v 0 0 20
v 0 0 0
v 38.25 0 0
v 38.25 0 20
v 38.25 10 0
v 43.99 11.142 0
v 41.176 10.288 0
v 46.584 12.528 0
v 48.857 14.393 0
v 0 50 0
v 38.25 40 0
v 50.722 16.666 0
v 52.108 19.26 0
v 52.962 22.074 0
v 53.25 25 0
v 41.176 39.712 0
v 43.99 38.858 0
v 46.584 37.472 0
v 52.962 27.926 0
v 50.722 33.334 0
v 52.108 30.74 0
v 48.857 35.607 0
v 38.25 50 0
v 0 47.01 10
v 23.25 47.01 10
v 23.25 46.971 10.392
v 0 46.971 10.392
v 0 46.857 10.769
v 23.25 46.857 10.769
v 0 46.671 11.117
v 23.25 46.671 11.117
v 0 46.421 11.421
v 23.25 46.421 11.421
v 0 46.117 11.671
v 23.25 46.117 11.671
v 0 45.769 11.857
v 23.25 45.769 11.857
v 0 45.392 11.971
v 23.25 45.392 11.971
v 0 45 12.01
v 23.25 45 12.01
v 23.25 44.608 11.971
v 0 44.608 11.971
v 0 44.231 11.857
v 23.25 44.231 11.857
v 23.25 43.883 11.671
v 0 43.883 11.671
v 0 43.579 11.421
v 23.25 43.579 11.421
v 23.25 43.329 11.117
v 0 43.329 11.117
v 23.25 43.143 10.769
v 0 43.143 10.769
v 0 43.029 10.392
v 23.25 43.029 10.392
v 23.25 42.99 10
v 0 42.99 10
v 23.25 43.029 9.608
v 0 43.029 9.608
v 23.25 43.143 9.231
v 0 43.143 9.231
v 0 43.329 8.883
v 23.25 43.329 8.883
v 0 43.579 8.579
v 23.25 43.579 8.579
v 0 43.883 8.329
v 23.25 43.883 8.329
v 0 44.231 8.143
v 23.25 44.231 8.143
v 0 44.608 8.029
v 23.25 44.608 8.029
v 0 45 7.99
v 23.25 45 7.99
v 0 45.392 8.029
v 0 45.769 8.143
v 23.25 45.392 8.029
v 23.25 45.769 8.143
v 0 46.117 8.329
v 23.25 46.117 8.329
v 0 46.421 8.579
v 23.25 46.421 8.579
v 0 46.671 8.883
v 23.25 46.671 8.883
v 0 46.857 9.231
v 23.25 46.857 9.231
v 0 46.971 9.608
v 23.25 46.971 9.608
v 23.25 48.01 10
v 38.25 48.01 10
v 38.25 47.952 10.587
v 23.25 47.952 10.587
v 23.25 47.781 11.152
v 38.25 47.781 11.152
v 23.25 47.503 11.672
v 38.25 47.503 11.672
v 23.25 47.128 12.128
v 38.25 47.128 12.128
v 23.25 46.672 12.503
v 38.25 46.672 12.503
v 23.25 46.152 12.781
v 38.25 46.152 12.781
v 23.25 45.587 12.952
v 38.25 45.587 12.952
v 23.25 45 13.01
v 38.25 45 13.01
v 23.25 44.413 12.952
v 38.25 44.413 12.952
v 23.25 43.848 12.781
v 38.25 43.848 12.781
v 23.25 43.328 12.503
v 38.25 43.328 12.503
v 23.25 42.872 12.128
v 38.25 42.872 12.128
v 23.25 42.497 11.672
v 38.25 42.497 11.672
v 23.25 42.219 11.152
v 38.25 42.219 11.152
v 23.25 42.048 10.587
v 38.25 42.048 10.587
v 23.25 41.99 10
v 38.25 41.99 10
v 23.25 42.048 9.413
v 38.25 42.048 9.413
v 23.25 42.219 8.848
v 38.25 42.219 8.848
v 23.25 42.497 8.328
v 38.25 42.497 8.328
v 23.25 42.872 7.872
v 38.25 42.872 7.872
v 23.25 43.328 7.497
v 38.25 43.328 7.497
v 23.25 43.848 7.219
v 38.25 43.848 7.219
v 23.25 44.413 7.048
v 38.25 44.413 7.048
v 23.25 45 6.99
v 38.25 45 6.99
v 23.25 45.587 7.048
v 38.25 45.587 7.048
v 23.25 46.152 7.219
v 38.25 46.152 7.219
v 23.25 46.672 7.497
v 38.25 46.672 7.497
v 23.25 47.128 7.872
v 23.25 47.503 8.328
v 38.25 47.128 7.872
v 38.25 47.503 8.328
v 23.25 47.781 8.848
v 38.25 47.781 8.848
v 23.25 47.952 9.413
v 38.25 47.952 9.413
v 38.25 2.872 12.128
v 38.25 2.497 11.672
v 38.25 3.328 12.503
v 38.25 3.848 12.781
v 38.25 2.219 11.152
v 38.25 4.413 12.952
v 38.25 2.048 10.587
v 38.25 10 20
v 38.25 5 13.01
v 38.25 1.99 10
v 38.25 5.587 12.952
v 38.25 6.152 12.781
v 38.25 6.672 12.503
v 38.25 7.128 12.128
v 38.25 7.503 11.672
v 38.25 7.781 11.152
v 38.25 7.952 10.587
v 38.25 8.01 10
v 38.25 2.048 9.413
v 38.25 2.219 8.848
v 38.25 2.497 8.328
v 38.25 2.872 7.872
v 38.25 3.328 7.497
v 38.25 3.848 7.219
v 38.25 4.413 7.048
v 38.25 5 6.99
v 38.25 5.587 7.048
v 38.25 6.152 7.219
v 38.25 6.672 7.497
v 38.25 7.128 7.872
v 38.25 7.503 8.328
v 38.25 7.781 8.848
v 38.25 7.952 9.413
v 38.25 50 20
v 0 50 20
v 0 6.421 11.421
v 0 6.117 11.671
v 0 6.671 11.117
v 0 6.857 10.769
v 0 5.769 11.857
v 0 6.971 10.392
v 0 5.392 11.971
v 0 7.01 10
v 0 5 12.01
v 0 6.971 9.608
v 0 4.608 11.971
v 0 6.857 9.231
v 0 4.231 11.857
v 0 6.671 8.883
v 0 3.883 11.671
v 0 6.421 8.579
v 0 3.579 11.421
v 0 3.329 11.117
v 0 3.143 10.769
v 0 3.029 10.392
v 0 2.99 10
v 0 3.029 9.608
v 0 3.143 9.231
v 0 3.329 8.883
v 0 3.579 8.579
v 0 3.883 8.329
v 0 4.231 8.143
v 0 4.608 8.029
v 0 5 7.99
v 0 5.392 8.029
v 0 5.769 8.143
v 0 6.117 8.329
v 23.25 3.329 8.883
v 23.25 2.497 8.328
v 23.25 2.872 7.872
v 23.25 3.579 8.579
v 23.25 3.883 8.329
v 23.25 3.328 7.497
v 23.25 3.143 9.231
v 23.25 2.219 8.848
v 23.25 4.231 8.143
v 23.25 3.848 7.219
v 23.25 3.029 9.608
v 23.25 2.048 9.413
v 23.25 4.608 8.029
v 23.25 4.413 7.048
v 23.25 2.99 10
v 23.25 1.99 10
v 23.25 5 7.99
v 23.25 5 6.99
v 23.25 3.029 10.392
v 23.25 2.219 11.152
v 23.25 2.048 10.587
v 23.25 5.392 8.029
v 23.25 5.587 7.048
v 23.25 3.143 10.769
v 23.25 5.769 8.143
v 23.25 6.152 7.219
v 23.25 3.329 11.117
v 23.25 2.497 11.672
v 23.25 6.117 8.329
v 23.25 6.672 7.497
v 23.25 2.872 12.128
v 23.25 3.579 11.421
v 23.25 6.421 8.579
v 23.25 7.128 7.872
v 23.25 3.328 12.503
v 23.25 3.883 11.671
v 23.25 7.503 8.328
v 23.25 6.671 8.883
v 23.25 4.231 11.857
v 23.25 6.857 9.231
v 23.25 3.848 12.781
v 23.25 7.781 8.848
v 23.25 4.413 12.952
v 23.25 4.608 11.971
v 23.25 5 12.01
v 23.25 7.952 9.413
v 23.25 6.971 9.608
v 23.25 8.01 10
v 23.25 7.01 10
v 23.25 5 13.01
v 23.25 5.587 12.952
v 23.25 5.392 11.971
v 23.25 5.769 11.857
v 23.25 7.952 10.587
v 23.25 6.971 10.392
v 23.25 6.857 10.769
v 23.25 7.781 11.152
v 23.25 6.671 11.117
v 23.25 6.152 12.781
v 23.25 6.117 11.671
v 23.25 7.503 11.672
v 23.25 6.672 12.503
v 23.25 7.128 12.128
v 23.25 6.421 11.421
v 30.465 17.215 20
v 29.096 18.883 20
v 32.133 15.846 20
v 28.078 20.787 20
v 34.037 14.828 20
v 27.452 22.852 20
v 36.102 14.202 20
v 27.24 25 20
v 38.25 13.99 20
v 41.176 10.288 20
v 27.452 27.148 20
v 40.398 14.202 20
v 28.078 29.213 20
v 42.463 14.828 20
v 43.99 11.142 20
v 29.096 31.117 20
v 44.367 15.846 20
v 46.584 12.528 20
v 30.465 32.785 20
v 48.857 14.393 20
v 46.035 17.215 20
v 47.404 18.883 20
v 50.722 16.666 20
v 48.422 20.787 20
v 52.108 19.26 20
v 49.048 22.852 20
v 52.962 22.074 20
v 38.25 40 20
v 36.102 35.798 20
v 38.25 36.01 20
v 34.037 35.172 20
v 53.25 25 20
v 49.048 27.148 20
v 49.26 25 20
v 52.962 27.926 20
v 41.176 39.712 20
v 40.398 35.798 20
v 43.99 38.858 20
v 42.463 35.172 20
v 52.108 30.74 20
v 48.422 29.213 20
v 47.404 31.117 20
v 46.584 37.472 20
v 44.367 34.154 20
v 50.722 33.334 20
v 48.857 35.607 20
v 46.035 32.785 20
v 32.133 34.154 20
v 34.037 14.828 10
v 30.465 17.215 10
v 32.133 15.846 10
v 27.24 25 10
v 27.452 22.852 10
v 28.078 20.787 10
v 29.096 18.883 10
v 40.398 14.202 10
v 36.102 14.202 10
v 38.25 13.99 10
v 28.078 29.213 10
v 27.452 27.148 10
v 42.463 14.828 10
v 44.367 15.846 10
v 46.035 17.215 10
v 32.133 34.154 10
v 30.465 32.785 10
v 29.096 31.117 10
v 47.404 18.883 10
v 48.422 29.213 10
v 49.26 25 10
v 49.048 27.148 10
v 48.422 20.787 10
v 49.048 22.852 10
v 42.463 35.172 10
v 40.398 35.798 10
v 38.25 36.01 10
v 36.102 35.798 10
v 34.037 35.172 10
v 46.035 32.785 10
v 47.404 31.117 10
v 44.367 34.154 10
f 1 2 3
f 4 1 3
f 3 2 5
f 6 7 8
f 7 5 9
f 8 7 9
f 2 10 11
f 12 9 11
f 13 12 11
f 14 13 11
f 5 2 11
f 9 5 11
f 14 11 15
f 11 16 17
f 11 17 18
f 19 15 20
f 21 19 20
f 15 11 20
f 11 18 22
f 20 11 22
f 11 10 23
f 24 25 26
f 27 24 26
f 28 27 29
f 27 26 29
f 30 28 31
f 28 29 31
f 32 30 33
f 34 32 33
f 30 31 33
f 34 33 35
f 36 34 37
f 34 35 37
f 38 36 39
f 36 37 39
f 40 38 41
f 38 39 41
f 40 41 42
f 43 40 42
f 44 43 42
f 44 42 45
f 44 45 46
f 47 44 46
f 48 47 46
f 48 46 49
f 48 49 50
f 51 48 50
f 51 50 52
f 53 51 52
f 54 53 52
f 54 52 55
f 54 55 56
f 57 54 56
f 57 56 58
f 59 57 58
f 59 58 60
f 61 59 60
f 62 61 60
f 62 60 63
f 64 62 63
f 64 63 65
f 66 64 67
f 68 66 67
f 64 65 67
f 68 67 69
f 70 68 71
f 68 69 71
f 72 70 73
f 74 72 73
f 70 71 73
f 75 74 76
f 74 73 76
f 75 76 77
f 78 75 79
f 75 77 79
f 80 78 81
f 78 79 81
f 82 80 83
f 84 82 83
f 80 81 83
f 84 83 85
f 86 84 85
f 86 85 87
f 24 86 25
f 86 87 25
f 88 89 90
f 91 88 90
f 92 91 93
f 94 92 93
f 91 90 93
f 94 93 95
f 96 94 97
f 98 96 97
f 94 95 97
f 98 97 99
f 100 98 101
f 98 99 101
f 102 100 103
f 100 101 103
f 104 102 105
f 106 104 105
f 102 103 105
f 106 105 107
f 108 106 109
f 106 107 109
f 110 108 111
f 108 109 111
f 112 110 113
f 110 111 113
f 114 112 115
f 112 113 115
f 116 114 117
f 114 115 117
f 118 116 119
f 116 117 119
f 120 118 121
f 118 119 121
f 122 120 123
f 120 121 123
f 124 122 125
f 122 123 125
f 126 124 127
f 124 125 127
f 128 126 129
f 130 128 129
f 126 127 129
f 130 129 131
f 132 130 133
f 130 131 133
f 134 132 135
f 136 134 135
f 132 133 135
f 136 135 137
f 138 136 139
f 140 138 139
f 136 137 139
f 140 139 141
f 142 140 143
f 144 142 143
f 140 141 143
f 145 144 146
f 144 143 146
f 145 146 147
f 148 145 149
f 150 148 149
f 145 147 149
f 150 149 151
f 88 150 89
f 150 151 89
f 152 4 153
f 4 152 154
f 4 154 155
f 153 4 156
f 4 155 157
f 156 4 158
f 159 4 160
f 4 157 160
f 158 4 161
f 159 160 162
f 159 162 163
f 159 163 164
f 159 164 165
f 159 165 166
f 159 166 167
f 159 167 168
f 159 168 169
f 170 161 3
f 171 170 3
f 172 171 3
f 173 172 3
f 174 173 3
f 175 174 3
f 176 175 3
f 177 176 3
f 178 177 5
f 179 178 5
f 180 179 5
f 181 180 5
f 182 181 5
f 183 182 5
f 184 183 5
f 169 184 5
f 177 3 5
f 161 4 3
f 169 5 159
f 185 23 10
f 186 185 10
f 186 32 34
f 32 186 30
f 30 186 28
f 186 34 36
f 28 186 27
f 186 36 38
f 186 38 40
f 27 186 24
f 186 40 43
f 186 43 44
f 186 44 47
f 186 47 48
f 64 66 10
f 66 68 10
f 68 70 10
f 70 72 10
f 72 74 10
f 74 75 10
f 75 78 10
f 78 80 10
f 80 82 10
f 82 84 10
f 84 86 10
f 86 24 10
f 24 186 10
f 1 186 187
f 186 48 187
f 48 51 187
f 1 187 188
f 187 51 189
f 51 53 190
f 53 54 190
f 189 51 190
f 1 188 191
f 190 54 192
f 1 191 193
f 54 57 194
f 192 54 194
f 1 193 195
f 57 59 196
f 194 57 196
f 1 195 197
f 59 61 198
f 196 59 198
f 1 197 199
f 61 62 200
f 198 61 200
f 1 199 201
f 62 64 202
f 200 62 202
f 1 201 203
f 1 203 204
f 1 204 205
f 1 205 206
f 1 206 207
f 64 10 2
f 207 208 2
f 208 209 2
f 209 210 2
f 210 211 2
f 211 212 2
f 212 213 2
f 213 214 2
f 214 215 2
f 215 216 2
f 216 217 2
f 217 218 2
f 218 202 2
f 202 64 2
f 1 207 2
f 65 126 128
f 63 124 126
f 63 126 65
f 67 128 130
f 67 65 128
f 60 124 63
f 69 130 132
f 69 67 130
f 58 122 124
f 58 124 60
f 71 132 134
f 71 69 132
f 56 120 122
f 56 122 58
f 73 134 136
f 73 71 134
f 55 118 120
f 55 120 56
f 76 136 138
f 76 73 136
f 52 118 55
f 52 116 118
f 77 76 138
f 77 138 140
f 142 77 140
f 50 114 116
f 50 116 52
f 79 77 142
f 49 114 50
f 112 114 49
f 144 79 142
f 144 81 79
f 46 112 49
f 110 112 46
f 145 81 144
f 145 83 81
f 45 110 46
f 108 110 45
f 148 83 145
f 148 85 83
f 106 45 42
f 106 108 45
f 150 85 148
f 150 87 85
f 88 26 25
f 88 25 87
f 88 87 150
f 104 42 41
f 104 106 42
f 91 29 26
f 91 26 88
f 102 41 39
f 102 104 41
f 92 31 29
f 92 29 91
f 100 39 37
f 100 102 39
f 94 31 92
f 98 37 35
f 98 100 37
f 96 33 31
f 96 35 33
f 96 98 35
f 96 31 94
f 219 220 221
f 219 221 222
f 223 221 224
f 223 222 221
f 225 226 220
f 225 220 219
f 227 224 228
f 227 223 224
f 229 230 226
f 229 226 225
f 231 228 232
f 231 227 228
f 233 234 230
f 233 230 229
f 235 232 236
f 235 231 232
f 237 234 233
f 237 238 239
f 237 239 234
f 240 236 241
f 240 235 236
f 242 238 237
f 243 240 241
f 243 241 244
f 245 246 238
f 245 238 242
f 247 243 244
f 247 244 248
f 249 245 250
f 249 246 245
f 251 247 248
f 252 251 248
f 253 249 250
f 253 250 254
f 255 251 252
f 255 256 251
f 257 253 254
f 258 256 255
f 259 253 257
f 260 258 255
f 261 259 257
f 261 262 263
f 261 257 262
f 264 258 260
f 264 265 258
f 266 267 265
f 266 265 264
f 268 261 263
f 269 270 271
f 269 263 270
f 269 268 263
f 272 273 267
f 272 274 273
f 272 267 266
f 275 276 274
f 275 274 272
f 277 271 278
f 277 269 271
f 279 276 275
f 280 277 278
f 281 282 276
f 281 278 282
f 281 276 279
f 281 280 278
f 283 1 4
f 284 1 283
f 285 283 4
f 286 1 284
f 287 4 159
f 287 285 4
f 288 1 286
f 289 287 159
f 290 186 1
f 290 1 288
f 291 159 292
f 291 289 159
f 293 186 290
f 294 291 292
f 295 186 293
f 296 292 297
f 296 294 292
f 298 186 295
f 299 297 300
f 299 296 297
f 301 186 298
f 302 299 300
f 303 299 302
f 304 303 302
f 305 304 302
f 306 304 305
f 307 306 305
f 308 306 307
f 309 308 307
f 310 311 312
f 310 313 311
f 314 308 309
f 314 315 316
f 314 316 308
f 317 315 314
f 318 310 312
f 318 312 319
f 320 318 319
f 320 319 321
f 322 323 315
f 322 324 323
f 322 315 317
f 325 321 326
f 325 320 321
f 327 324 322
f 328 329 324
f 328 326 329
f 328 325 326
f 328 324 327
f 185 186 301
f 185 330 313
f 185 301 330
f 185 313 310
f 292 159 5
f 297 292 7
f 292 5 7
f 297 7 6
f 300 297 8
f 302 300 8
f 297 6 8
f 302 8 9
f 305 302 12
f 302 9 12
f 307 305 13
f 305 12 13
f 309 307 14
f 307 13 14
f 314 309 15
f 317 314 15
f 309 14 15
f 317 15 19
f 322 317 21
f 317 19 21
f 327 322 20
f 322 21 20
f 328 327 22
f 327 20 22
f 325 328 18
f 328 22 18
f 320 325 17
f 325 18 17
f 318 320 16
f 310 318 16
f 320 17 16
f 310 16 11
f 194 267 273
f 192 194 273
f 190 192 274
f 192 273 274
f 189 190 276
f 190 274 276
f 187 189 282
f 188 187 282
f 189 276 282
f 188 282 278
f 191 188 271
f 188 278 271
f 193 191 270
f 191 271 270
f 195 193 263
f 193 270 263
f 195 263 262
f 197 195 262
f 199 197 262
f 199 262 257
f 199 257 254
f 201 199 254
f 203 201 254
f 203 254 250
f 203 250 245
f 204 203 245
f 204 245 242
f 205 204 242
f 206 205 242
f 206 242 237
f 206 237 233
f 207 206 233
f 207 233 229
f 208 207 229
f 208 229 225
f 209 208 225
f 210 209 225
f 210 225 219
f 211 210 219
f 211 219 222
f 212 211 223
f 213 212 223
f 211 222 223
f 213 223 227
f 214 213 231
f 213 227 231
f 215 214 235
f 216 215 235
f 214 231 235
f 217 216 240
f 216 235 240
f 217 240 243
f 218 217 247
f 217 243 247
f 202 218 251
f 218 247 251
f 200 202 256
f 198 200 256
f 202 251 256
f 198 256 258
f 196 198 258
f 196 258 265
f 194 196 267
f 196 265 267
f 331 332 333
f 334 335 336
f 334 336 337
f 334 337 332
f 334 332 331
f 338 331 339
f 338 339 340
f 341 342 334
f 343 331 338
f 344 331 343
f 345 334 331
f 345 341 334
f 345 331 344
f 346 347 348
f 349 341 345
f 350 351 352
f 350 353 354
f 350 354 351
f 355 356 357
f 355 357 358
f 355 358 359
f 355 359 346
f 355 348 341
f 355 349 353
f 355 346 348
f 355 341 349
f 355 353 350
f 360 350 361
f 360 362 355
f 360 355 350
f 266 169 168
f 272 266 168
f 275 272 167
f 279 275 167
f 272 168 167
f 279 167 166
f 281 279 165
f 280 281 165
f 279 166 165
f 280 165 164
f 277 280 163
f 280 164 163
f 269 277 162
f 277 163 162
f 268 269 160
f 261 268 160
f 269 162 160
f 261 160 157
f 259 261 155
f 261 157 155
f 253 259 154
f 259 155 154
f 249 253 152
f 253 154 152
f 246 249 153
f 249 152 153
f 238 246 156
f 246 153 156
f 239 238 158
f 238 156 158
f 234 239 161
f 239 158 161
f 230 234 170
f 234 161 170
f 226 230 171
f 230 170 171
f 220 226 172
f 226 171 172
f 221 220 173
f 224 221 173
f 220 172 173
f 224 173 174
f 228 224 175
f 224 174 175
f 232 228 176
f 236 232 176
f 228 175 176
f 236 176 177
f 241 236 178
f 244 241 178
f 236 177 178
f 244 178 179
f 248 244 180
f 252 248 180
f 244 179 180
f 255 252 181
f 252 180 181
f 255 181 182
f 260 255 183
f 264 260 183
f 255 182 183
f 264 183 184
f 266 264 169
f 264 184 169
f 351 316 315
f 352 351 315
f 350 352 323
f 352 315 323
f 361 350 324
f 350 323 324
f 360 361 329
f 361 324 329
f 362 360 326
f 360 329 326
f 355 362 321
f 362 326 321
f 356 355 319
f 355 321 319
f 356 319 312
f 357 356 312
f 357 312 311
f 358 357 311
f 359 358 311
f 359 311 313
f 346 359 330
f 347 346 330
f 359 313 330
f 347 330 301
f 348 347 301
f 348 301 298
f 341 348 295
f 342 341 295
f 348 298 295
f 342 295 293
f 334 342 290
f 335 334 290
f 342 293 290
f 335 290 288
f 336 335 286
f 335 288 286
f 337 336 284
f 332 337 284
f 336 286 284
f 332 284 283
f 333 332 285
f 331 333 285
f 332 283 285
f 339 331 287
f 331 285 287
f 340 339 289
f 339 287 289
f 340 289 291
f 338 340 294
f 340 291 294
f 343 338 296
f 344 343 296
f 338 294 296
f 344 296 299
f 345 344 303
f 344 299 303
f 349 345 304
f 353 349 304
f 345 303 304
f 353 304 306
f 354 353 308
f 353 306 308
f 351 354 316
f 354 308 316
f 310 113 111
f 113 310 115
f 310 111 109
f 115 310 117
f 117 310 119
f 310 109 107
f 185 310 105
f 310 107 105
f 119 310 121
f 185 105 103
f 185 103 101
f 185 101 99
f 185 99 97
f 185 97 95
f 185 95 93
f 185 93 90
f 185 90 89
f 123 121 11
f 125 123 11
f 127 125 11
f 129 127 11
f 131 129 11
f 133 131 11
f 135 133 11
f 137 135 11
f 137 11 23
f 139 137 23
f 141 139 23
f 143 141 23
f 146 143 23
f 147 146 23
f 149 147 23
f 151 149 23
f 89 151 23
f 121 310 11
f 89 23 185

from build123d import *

# Parameters (mm, degrees)
F1_DEPTH  = 20
F2_R      = 11.01
F3_DEPTH  = 10
F4_R      = 3.01
F5_DEPTH  = 15
F6_R      = 3.01
F7_DEPTH  = 15
F8_R      = 2.01
F9_DEPTH  = 23.251
F10_R     = 2.01
F11_DEPTH = 23.251


with BuildPart() as f1:
    # F0 (on Top) → F1 (new body)
    with BuildSketch(Plane.XY):
        with BuildLine():
            Line((0, 50), (0, 0))
            Line((0, 0), (26.933724, 0))
            Line((26.933724, 0), (38.25, 0))
            Line((38.25, 0), (38.25, 10))
            ThreePointArc((38.25, 10), (53.25, 25), (38.25, 40))
            Line((38.25, 40), (38.25, 50))
            Line((38.25, 50), (0, 50))
        make_face()
    extrude(amount=F1_DEPTH)

    # F2 (on face) → F3 (cut)
    with BuildSketch(Plane.XY.offset(20)):
        with Locations((38.25, 25)):
            Circle(F2_R)
    extrude(amount=-F3_DEPTH, mode=Mode.SUBTRACT)

    # F4 (on face) → F5 (cut)
    with BuildSketch(Plane.YZ.offset(38.25)):
        with Locations((45, 10)):
            Circle(F4_R)
    extrude(amount=-F5_DEPTH, mode=Mode.SUBTRACT)

    # F6 (on face) → F7 (cut)
    with BuildSketch(Plane.YZ.offset(38.25)):
        with Locations((5, 10)):
            Circle(F6_R)
    extrude(amount=-F7_DEPTH, mode=Mode.SUBTRACT)

    # F8 (on face) → F9 (cut, through all)
    with BuildSketch(Plane.YZ.offset(23.25)):
        with Locations((5, 10)):
            Circle(F8_R)
    extrude(amount=-F9_DEPTH, mode=Mode.SUBTRACT)

    # F10 (on face) → F11 (cut, through all)
    with BuildSketch(Plane.YZ.offset(23.25)):
        with Locations((45, 10)):
            Circle(F10_R)
    extrude(amount=-F11_DEPTH, mode=Mode.SUBTRACT)


solid = f1.part
